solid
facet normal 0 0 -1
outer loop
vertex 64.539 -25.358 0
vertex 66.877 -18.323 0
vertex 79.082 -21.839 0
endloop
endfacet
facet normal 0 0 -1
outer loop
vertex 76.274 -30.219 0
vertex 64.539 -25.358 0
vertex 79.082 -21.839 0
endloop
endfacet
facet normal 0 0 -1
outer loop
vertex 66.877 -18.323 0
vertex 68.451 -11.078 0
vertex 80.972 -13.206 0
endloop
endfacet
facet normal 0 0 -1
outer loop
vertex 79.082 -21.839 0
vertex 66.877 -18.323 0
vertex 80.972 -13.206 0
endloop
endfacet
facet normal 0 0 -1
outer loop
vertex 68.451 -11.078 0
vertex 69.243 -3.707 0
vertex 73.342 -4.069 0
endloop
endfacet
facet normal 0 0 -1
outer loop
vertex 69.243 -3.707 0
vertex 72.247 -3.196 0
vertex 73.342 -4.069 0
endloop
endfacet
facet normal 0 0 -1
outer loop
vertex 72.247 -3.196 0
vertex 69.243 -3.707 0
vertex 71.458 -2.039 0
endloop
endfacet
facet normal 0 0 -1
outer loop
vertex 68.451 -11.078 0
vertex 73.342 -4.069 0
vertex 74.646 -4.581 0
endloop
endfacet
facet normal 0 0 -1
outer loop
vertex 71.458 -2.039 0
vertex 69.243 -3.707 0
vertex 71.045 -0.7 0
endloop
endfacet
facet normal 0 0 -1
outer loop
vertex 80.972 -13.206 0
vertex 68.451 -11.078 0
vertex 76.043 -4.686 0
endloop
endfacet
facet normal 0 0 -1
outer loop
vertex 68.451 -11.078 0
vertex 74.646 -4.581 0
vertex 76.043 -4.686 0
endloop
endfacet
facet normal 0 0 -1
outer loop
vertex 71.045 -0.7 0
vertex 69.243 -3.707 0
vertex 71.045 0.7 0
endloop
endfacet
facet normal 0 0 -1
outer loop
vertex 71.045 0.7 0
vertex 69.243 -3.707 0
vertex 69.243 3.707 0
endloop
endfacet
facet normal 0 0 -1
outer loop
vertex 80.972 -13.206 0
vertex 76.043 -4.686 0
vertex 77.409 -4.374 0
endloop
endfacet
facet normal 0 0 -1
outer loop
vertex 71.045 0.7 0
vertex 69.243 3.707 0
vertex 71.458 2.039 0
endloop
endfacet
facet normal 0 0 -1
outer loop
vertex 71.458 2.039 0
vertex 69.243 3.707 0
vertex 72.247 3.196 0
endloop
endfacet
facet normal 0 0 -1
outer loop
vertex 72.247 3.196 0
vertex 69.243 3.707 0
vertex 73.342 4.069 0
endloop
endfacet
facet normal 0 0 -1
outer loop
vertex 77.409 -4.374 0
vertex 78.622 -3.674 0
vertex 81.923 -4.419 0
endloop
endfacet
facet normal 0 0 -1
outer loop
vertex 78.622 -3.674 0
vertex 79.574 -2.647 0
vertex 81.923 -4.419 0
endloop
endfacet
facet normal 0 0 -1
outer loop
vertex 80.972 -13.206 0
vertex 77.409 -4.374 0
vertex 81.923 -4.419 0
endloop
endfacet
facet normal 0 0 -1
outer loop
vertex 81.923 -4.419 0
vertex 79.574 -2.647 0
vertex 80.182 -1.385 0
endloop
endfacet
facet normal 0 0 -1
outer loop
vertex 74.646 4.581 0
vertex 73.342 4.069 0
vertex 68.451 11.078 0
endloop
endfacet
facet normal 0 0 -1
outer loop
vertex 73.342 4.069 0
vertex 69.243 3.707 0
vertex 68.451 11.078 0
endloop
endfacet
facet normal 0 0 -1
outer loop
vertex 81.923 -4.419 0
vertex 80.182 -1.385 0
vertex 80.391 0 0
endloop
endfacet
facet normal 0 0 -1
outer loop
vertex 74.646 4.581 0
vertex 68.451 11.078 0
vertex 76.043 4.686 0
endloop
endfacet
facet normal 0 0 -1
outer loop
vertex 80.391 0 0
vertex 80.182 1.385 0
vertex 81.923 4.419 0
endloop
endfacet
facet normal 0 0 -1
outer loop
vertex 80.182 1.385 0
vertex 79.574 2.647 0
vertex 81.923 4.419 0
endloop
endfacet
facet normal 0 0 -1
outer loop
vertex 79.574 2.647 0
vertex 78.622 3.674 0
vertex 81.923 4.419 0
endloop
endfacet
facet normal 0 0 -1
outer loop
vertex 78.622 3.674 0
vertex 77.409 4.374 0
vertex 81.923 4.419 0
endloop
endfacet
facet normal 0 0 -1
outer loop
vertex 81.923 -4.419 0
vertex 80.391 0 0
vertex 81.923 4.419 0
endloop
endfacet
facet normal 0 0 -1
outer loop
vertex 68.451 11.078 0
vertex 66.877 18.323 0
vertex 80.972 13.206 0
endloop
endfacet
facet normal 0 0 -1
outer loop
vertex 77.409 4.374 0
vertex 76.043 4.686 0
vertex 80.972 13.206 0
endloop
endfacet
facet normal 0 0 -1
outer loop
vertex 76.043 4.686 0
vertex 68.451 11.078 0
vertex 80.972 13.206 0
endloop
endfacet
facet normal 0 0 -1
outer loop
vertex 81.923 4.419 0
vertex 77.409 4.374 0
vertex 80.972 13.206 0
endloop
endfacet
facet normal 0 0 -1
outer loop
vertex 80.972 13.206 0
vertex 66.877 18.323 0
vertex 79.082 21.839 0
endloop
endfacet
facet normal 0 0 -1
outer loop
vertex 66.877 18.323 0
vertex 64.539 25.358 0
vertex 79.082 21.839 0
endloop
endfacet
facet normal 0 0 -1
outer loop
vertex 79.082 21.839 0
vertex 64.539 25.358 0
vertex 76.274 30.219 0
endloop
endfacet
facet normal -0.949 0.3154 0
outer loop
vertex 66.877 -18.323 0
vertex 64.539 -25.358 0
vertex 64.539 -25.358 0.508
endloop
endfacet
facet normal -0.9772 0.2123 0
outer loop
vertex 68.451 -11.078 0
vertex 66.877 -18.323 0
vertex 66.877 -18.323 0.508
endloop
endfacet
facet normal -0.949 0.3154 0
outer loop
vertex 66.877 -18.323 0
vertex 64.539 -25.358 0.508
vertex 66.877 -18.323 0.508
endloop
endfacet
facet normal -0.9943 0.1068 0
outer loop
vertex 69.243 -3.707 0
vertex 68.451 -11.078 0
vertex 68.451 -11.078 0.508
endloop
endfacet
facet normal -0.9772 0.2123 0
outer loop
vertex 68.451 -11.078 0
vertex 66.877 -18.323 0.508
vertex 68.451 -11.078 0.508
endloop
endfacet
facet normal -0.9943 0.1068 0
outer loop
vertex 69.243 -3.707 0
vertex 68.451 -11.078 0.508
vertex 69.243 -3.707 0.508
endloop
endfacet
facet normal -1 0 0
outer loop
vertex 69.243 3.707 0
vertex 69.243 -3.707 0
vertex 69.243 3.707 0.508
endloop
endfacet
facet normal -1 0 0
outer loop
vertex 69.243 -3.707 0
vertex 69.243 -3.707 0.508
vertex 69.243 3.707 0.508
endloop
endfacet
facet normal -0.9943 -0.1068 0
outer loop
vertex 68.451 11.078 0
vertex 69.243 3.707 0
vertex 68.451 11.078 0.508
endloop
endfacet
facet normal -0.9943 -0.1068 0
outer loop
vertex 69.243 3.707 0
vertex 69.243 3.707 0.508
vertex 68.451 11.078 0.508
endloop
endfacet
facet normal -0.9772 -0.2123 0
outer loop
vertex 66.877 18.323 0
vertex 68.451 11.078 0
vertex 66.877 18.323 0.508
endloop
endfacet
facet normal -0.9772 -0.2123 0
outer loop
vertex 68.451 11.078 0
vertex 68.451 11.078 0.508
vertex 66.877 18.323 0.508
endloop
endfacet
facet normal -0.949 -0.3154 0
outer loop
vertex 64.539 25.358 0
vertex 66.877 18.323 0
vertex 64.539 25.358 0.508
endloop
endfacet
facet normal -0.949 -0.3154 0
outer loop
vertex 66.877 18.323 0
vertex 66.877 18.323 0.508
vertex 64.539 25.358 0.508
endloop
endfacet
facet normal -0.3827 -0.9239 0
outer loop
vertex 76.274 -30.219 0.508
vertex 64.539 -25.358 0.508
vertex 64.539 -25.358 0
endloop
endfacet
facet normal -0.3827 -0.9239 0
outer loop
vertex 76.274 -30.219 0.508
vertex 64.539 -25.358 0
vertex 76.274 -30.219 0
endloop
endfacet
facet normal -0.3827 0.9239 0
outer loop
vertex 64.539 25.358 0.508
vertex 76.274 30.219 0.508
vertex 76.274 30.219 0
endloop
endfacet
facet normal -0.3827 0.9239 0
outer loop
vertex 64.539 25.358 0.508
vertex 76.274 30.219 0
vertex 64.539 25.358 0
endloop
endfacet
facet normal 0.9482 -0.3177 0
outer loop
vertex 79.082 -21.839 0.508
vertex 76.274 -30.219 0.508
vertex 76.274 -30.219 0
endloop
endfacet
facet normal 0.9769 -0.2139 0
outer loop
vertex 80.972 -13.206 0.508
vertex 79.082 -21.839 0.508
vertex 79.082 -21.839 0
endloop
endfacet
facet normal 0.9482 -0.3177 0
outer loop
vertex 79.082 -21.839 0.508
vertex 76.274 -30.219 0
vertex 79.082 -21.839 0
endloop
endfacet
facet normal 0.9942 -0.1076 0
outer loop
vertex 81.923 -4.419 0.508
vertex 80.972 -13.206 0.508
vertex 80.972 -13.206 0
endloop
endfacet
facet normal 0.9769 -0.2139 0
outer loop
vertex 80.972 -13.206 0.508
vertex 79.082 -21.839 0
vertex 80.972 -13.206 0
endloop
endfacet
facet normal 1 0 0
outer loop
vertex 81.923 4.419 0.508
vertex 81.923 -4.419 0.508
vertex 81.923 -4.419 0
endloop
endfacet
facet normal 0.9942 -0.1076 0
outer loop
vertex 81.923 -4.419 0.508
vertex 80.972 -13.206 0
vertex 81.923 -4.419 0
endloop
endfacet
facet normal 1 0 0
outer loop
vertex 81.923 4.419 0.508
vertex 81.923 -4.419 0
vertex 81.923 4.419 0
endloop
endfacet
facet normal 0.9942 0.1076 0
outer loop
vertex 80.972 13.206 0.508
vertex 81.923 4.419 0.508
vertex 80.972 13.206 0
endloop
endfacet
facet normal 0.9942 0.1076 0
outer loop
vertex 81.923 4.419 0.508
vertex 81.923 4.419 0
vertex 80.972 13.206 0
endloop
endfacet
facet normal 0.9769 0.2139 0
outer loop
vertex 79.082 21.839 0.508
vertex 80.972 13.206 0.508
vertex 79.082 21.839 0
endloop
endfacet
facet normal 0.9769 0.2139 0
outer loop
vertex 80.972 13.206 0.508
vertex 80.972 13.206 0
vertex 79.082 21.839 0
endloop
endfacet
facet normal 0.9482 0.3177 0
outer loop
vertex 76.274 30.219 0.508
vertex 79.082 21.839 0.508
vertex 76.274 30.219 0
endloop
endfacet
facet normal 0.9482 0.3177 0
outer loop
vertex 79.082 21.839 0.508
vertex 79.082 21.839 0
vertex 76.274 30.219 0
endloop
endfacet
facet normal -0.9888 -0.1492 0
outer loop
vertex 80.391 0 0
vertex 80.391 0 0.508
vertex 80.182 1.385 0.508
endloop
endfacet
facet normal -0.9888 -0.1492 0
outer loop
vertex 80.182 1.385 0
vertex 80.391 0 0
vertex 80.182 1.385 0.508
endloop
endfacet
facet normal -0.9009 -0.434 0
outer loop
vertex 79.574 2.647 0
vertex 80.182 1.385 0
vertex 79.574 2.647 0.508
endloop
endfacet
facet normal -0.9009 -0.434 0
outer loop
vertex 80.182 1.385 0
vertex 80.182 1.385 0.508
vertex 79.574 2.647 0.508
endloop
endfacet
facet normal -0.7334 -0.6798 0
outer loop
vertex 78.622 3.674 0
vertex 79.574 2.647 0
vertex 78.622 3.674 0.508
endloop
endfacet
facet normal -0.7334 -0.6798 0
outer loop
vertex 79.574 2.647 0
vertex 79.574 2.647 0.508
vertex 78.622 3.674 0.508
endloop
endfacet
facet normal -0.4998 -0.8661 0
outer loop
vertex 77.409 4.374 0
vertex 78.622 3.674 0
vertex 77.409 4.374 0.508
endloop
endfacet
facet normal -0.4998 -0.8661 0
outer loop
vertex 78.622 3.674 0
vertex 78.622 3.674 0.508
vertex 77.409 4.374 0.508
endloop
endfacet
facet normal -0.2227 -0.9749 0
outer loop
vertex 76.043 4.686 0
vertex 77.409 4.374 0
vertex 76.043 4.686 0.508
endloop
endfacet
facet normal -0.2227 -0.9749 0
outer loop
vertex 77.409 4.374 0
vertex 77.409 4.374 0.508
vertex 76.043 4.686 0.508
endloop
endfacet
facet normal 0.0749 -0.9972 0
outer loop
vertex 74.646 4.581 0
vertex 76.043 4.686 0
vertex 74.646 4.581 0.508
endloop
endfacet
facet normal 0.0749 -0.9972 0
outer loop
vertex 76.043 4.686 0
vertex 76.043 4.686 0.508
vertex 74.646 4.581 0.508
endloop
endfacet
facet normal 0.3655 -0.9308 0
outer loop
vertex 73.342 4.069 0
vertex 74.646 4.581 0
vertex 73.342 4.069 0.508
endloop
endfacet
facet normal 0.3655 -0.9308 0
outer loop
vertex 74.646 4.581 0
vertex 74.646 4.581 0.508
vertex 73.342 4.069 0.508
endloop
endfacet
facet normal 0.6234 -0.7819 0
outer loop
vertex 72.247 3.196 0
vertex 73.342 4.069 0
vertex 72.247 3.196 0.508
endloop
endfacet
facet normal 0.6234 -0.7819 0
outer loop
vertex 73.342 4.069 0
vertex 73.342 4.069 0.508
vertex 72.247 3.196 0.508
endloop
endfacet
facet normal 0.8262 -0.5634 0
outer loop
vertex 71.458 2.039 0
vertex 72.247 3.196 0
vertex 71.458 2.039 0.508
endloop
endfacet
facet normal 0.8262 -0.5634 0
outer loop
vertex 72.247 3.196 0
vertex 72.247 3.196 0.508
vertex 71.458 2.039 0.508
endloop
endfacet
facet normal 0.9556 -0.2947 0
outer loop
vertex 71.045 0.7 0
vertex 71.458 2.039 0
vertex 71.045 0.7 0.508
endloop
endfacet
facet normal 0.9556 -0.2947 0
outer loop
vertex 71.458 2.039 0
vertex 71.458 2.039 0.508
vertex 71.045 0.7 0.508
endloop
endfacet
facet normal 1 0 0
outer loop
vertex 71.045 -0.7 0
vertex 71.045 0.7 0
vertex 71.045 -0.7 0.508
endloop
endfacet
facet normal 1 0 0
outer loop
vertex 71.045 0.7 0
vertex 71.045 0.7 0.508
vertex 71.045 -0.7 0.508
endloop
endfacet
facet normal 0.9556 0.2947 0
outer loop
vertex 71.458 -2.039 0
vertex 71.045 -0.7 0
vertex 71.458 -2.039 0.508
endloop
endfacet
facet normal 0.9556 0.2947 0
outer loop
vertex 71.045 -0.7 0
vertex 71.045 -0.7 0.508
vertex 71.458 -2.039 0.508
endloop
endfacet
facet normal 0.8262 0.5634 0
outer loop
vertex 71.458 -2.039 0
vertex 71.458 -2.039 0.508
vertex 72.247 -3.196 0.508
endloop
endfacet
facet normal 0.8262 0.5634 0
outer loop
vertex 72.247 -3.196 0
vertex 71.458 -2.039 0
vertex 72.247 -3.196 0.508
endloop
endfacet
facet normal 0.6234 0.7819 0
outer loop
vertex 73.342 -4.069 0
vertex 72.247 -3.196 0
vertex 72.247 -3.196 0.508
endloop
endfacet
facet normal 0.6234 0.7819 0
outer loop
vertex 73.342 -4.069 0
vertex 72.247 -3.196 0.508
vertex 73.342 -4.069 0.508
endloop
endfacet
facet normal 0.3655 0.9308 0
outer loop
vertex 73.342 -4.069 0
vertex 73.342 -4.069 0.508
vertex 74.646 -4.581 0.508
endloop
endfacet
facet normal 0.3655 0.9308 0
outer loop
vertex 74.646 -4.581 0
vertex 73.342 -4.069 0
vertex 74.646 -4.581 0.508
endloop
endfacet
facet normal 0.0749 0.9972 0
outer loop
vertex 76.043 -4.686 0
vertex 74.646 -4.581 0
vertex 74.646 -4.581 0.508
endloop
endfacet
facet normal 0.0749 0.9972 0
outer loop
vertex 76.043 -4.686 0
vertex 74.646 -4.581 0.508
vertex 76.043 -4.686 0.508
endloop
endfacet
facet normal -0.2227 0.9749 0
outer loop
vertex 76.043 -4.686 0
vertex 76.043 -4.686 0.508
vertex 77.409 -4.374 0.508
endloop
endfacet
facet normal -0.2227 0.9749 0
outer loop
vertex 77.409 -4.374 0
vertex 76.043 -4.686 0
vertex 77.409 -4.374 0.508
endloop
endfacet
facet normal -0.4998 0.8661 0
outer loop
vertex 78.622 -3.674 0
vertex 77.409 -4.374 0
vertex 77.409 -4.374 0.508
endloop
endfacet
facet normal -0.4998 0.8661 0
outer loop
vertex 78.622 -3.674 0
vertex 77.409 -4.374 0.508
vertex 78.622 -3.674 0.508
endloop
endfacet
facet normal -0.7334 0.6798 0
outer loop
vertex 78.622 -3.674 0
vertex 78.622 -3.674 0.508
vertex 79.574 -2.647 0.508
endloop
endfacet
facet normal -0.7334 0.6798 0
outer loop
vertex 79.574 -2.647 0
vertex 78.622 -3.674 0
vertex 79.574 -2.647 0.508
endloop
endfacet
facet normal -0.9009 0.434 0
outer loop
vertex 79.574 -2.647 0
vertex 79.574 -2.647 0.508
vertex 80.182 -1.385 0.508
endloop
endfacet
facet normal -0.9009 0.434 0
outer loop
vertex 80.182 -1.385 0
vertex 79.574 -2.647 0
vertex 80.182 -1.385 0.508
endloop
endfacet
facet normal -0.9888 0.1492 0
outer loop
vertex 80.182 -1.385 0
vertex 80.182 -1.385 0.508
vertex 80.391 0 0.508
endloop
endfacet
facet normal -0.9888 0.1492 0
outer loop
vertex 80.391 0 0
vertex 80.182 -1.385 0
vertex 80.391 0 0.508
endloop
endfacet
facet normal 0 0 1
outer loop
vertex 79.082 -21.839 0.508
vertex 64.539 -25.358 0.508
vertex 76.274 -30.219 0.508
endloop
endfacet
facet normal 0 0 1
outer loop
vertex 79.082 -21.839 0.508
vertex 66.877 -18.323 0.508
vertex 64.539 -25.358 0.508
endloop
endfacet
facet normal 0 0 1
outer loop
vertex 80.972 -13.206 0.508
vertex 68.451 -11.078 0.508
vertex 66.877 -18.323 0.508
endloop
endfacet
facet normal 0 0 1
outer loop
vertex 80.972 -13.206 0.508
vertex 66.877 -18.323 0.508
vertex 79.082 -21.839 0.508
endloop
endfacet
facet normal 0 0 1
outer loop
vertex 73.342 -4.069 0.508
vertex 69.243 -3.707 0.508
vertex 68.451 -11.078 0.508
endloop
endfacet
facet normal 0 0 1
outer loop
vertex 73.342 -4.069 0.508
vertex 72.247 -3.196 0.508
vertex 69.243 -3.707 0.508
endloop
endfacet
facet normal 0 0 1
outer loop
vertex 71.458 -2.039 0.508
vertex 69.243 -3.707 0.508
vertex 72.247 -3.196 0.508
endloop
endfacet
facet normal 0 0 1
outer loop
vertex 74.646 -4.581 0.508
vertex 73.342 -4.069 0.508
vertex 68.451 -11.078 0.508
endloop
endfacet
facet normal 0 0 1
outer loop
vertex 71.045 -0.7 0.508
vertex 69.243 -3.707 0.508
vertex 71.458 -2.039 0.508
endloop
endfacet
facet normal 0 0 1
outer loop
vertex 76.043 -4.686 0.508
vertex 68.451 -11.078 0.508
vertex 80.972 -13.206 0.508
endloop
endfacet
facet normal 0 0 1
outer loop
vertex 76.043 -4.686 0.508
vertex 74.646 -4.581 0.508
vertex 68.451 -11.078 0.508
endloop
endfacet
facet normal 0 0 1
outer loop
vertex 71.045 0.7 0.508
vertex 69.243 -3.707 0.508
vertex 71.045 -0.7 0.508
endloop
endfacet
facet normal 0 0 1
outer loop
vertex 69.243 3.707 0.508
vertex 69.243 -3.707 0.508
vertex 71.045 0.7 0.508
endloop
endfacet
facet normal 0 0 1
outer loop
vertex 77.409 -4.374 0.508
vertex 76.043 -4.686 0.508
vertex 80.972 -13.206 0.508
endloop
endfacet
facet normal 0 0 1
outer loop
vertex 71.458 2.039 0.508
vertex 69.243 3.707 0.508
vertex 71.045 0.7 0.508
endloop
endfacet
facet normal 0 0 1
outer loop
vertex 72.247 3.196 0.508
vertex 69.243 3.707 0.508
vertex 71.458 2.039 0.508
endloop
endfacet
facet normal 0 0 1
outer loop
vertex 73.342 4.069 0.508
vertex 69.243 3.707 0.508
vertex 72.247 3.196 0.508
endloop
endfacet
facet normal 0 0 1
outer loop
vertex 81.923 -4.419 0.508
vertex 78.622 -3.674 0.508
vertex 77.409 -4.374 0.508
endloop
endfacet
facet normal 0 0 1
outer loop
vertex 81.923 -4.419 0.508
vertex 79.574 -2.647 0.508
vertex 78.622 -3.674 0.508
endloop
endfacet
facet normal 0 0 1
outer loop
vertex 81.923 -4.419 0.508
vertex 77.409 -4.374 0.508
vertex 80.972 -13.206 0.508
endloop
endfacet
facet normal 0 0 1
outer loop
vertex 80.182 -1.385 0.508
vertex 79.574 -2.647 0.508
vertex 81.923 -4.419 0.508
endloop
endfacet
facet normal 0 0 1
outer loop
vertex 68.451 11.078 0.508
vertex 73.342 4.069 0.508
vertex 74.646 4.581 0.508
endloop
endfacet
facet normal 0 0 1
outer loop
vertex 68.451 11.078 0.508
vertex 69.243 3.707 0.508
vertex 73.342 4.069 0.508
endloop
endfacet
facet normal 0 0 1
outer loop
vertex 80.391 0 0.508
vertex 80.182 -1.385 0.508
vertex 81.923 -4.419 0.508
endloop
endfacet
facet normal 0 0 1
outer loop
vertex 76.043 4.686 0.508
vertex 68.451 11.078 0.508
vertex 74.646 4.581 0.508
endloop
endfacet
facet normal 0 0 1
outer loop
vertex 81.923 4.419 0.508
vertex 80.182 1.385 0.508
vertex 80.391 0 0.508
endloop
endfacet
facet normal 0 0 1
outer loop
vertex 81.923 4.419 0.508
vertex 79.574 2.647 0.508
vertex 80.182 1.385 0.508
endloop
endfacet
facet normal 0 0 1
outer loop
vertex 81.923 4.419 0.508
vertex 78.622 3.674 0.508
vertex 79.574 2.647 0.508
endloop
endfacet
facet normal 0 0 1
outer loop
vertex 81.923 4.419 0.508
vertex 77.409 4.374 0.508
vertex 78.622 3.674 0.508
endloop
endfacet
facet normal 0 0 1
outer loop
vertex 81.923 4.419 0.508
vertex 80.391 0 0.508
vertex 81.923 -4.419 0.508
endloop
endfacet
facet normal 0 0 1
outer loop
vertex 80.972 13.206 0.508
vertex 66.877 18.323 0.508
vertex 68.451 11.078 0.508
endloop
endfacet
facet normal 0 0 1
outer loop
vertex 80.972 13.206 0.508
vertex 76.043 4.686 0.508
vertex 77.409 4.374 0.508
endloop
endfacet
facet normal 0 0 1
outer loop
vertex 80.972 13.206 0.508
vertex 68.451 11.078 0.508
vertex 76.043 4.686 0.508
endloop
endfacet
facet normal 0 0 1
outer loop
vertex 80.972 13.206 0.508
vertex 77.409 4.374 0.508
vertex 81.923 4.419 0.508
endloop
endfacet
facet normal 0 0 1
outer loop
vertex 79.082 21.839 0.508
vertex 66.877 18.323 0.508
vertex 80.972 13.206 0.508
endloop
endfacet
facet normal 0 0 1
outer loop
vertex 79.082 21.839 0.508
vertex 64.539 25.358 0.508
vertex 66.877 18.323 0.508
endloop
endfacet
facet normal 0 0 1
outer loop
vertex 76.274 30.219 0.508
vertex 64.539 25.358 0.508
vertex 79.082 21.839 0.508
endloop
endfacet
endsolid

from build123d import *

# Parameters (mm, degrees)
SKETCH4_R           = 82.042
BOSS_EXTRUDE2_DEPTH = 0.508
SKETCH5_R           = 69.342
CUT_EXTRUDE5_DEPTH  = 1.508
SKETCH6_R           = 4.699
CUT_EXTRUDE6_DEPTH  = 1.508
SKETCH8_OUTSIDE_W   = 212.494
SKETCH8_OUTSIDE_H   = 212.494
CUT_EXTRUDE11_DEPTH = 1.508


with BuildPart() as part:
    # Sketch4 → Boss-Extrude2 (new body)
    with BuildSketch(Plane.XY):
        Circle(SKETCH4_R)
    extrude(amount=BOSS_EXTRUDE2_DEPTH)

    # Sketch5 → Cut-Extrude5 (cut, through all)
    with BuildSketch(Plane.XY.offset(0.508)):
        Circle(SKETCH5_R)
    extrude(amount=-CUT_EXTRUDE5_DEPTH, mode=Mode.SUBTRACT)

    # Sketch6 → Cut-Extrude6 (cut, through all)
    with BuildSketch(Plane.XY.offset(0.508)):
        with Locations((75.692, 0)):
            Circle(SKETCH6_R)
    extrude(amount=-CUT_EXTRUDE6_DEPTH, mode=Mode.SUBTRACT)

    # Sketch8 outside → Cut-Extrude11 (cut, through all)
    with BuildSketch(Plane.XY.offset(0.508)):
        Rectangle(SKETCH8_OUTSIDE_W, SKETCH8_OUTSIDE_H)
        with BuildLine():
            Line((64.538916848, -25.358256565), (76.273850543, -30.219025255))
            ThreePointArc((76.273850543, -30.219025255), (82.042, 0), (76.273850543, 30.219025255))
            Line((76.273850543, 30.219025255), (64.538916848, 25.358256565))
            ThreePointArc((64.538916848, 25.358256565), (69.342, 0), (64.538916848, -25.358256565))
        make_face(mode=Mode.SUBTRACT)
    extrude(amount=-CUT_EXTRUDE11_DEPTH, mode=Mode.SUBTRACT)


solid = part.part
